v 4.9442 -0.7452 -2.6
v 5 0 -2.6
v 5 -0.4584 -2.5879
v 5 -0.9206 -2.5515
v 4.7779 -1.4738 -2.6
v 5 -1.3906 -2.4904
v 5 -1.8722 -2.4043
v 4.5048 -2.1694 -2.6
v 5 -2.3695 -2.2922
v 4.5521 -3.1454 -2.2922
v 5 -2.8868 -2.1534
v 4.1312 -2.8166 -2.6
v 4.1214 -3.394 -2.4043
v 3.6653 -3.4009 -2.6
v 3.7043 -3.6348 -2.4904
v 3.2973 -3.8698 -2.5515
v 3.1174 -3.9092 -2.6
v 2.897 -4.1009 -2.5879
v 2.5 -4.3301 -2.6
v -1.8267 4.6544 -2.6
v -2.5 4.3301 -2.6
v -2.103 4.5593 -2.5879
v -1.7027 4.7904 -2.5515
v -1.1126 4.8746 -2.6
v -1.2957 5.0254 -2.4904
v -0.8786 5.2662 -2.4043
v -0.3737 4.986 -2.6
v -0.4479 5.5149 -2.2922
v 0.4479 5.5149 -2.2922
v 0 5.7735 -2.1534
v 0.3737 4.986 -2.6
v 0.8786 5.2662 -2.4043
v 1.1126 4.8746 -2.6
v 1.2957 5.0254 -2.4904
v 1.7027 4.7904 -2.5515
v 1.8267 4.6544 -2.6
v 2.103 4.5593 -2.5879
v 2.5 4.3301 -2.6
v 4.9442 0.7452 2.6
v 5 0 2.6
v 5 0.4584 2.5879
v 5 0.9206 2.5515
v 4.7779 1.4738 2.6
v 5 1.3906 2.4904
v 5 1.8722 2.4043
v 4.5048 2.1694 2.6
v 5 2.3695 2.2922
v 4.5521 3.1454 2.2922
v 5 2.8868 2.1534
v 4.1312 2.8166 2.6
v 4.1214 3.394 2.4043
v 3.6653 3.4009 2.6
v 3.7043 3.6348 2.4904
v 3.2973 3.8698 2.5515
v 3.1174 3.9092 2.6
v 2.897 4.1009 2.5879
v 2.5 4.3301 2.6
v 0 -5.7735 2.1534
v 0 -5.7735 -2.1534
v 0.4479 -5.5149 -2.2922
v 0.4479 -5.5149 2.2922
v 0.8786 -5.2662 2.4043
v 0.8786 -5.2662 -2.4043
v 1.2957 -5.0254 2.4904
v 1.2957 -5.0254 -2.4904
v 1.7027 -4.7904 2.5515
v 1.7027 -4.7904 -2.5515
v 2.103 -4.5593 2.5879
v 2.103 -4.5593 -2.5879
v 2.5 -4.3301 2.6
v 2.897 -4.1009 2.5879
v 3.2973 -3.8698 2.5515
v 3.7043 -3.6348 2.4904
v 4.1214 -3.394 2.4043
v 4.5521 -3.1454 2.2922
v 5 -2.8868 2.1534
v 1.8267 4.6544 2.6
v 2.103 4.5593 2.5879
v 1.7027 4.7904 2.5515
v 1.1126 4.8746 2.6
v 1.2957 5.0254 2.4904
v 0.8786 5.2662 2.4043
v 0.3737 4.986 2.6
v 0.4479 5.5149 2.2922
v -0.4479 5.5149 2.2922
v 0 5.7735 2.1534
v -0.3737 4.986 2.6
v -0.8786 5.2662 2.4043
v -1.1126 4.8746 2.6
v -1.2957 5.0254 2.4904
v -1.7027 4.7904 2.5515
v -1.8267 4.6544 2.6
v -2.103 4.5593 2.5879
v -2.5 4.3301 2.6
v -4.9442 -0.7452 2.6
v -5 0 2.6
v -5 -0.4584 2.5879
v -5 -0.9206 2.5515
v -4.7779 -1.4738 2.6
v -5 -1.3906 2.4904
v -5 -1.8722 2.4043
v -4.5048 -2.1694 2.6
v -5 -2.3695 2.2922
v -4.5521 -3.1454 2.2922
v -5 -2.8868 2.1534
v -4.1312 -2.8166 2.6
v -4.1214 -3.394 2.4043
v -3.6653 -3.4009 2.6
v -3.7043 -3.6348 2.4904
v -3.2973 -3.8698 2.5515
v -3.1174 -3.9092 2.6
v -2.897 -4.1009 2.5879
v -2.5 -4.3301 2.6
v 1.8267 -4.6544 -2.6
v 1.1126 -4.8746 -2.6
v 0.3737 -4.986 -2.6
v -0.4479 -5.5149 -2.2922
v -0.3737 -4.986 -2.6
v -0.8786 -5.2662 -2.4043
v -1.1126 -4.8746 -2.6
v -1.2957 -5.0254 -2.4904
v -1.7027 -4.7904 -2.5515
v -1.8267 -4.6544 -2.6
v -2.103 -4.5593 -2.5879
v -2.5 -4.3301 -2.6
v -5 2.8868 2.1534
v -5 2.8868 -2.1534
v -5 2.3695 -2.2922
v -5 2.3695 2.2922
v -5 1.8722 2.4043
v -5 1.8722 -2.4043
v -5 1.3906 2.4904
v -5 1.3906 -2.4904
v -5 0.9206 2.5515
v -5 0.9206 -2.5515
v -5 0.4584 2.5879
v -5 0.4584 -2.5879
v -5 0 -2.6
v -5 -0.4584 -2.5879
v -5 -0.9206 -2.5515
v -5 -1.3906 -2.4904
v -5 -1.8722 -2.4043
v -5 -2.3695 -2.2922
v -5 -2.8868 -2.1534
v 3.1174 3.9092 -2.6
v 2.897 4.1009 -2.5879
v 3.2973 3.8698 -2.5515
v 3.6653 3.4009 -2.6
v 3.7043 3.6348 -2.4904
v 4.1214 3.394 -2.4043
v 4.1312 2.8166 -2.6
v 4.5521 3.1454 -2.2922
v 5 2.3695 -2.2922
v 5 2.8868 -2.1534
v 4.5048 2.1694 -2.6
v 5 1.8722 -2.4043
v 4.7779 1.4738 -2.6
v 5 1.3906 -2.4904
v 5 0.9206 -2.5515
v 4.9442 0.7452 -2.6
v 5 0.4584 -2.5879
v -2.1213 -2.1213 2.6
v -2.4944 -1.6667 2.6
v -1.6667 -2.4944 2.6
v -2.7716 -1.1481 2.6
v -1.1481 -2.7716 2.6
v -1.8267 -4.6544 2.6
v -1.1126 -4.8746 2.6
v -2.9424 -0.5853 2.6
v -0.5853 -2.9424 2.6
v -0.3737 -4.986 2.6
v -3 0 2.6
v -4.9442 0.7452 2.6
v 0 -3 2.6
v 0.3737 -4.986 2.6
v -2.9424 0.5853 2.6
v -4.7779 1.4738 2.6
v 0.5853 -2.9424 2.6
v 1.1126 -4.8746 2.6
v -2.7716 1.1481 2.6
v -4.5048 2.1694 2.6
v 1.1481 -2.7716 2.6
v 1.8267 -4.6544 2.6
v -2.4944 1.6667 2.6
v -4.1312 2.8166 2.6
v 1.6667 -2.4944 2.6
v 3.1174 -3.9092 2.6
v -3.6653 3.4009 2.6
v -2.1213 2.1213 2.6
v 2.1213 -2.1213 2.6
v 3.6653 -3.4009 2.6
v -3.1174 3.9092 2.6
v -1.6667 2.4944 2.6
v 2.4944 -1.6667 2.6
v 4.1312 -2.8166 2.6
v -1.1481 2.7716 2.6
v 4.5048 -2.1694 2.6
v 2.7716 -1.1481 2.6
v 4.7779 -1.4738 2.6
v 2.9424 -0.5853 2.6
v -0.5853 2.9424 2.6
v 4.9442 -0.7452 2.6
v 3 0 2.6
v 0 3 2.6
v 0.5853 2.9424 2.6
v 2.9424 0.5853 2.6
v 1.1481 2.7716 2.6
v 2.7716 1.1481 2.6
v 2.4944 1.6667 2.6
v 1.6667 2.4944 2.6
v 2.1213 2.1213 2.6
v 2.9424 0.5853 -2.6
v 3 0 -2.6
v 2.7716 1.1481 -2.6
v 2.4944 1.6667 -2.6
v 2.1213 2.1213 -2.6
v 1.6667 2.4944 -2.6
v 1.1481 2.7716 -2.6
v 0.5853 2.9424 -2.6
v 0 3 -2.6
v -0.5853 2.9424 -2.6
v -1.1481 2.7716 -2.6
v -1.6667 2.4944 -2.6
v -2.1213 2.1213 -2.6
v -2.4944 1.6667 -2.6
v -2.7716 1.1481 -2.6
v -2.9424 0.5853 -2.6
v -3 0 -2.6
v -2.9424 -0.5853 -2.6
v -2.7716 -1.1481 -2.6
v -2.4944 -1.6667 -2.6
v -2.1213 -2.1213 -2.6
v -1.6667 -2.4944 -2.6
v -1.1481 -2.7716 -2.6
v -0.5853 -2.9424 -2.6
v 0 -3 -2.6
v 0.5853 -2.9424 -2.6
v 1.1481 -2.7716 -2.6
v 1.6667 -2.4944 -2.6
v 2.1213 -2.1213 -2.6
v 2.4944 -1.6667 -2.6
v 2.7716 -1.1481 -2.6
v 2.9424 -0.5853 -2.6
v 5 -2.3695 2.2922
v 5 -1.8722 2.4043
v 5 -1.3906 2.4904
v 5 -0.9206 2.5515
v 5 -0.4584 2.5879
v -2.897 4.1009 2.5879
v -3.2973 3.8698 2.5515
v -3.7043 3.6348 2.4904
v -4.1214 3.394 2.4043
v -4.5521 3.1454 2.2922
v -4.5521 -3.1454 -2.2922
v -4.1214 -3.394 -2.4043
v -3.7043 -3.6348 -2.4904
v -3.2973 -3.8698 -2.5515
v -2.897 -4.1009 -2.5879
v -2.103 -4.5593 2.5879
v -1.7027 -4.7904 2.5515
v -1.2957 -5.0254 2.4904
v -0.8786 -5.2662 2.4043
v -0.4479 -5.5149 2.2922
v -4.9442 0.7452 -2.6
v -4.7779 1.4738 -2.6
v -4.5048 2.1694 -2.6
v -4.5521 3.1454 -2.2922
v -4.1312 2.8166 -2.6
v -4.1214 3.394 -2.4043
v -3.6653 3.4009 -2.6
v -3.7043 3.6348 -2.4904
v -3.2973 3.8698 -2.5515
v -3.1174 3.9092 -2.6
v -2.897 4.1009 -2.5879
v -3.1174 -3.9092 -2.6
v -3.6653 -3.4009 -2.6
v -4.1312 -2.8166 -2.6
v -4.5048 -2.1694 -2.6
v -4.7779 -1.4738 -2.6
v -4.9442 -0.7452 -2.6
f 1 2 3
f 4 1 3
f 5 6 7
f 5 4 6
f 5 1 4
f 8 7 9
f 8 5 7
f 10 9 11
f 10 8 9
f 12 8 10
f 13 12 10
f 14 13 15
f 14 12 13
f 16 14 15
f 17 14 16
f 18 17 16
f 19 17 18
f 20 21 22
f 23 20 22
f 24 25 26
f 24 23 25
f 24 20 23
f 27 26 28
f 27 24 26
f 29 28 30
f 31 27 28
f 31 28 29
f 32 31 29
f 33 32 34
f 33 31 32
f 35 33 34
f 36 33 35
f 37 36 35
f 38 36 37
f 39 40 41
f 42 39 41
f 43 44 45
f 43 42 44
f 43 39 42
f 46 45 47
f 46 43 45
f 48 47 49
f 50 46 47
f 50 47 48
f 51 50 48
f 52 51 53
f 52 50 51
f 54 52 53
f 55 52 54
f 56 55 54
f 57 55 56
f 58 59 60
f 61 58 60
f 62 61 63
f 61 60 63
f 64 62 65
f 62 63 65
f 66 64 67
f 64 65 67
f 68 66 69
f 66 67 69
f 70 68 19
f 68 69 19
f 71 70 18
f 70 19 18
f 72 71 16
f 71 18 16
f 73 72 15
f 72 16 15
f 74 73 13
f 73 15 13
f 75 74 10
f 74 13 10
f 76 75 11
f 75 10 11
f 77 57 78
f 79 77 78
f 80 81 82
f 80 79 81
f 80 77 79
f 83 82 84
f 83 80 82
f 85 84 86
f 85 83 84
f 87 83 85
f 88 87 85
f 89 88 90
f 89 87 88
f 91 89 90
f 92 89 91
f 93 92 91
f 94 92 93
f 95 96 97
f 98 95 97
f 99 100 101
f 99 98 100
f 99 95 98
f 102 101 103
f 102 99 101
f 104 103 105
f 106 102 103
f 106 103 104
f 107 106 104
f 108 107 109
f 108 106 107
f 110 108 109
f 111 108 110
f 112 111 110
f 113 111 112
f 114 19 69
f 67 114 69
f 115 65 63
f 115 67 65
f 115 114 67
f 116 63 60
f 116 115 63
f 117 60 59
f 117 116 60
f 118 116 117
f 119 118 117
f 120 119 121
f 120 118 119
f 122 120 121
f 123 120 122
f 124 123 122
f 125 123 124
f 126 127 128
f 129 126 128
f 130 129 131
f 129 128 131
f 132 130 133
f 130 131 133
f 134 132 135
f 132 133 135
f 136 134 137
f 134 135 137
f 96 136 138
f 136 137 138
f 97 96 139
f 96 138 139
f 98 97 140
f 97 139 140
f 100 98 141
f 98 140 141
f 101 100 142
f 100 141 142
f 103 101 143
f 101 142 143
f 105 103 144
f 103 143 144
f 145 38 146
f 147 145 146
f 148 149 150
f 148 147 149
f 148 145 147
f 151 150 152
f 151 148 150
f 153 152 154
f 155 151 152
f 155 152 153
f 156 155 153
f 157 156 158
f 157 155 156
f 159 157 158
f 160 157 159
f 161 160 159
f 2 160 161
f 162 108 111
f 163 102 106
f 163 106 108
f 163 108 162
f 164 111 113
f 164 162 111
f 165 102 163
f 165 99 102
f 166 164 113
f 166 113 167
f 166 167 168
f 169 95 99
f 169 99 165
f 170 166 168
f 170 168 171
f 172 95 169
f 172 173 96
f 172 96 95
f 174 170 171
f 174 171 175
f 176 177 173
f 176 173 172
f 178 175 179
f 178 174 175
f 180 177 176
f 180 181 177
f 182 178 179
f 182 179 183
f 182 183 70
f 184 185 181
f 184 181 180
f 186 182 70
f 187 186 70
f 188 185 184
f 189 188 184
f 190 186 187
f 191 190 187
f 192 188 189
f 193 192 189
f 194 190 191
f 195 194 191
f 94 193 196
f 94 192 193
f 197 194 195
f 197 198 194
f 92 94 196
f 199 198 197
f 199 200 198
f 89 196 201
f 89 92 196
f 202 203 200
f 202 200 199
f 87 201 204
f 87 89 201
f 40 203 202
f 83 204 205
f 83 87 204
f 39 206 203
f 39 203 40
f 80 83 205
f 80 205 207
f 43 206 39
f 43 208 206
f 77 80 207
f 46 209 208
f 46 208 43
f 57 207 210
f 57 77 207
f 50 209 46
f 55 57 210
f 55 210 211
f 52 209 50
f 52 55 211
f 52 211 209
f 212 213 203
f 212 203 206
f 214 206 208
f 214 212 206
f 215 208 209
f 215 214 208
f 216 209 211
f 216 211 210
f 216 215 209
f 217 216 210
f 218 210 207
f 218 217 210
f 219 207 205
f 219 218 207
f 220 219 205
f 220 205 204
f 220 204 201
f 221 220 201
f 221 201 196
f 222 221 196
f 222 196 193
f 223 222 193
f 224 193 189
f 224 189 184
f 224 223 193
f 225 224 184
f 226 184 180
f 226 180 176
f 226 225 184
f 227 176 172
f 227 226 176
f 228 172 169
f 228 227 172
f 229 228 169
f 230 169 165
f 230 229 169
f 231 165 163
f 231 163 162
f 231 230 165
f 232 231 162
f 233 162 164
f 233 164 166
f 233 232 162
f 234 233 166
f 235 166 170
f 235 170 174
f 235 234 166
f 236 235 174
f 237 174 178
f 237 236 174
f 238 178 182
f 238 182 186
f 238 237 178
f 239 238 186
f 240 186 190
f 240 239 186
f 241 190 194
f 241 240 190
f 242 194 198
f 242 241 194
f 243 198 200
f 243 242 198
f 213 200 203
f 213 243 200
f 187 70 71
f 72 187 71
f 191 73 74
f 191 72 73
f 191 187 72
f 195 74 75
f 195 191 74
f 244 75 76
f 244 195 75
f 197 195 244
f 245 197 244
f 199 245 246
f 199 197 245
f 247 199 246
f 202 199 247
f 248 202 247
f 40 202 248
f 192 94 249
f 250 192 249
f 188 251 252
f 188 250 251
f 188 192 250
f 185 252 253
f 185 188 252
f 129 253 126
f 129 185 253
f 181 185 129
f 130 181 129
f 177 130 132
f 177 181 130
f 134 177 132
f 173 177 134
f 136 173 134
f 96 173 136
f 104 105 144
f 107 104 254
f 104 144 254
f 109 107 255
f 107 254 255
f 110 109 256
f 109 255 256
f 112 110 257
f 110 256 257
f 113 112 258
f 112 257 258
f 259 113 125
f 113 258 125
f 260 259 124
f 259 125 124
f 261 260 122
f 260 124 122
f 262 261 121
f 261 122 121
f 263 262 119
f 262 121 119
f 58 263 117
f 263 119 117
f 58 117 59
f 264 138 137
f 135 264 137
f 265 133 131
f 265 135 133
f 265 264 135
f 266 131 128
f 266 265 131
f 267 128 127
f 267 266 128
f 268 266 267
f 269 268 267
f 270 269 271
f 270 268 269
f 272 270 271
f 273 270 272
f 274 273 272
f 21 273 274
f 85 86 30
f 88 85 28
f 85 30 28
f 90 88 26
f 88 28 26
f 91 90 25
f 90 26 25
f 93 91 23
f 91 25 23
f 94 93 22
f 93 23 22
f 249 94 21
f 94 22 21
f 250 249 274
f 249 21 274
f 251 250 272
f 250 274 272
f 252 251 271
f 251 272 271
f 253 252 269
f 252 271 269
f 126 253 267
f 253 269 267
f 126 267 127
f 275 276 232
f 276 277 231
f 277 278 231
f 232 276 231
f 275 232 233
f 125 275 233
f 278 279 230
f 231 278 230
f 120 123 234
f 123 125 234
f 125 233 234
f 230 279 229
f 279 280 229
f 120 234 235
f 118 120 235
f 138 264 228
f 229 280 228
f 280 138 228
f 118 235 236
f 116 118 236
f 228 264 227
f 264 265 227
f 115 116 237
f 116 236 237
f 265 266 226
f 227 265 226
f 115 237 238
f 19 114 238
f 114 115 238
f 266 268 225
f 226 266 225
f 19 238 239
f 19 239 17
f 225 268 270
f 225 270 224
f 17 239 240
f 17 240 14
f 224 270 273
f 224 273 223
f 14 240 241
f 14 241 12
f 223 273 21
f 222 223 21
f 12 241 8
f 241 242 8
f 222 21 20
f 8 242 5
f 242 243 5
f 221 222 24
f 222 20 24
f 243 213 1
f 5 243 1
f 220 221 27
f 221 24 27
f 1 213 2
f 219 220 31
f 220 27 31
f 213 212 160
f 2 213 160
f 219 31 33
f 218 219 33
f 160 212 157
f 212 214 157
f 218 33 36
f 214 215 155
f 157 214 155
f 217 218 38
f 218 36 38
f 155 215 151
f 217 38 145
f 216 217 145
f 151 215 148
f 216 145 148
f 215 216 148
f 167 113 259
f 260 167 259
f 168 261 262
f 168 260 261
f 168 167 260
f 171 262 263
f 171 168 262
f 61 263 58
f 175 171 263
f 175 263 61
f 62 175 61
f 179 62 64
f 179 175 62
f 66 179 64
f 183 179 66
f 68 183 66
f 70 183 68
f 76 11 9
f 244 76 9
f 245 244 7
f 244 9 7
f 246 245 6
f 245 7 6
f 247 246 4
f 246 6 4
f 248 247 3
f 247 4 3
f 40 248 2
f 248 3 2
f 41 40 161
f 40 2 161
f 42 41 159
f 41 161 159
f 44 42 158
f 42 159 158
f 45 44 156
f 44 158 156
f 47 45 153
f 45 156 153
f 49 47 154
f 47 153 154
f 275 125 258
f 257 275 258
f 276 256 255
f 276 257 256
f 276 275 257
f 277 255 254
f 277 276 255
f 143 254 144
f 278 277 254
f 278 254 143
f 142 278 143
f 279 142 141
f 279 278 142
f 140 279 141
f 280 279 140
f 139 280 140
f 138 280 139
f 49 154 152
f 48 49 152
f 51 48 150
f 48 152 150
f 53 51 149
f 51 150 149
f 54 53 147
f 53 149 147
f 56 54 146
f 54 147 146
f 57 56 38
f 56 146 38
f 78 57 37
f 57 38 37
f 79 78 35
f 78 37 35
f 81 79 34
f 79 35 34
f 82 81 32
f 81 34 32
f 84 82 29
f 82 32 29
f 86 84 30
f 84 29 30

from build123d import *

# Parameters (mm, degrees)
BOSS_EXTRUDE1_DEPTH      = 2.6
BOSS_EXTRUDE1_DEPTH_BACK = 2.6
SKETCH2_R                = 3
SKETCH3_OUTSIDE_W        = 50.698
SKETCH3_OUTSIDE_H        = 52.246
SKETCH3_OUTSIDE_R        = 5
CUT_EXTRUDE1_DEPTH       = 10.239769117
CUT_EXTRUDE1_DRAFT       = -60
MIRROR1_COPY_1_SKETCH_W  = 50.698
MIRROR1_COPY_1_SKETCH_H  = 52.246
MIRROR1_COPY_1_SKETCH_R  = 5
MIRROR1_COPY_1_DEPTH     = 10.239769117
MIRROR1_COPY_1_DRAFT     = -60


with BuildPart() as part:
    # Sketch2 → Boss-Extrude1 (new, two sides: drawn at the far end of the back side and taken through both)
    with BuildSketch(Plane.XY.offset(-BOSS_EXTRUDE1_DEPTH_BACK)):
        Polygon((0, 5.773502692), (-5, 2.886751346), (-5, -2.886751346), (0, -5.773502692), (5, -2.886751346), (5, 2.886751346), align=None)
        Circle(SKETCH2_R, mode=Mode.SUBTRACT)
    extrude(amount=BOSS_EXTRUDE1_DEPTH + BOSS_EXTRUDE1_DEPTH_BACK)


with BuildPart() as cut_extrude1_tool:
    # Sketch3 outside → Cut-Extrude1 (with draft: the straight prism first)
    with BuildSketch(Plane.XY.offset(2.6)):
        Rectangle(SKETCH3_OUTSIDE_W, SKETCH3_OUTSIDE_H)
        Circle(SKETCH3_OUTSIDE_R, mode=Mode.SUBTRACT)
    extrude(amount=-CUT_EXTRUDE1_DEPTH)
    # Cut-Extrude1: the draft: its side faces are tilted about the plane it starts from
    cut_extrude1_sides = [cut_extrude1_tool.faces().sort_by_distance(p)[0] for p in [
        (0, -26.123, -2.519884558),
        (25.349, 0, -2.519884558),
        (0, 26.123, -2.519884558),
        (-25.349, 0, -2.519884558),
        (-5, 0, -2.519884558),
    ]]
    draft(cut_extrude1_sides, Plane.XY.offset(2.6), CUT_EXTRUDE1_DRAFT)


with BuildPart() as part_1:
    add(part.part)

    # Cut-Extrude1: cut by cut_extrude1_tool
    add(cut_extrude1_tool.part, mode=Mode.SUBTRACT)


with BuildPart() as mirror1_copy_1_tool:
    # Mirror1 copy 1 sketch → Mirror1 copy 1 (with draft: the straight prism first)
    with BuildSketch(Plane(origin=(0, 0, -2.6), x_dir=(1, 0, 0), z_dir=(0, 0, -1))):
        Rectangle(MIRROR1_COPY_1_SKETCH_W, MIRROR1_COPY_1_SKETCH_H)
        Circle(MIRROR1_COPY_1_SKETCH_R, mode=Mode.SUBTRACT)
    extrude(amount=-MIRROR1_COPY_1_DEPTH)
    # Mirror1 copy 1: the draft: its side faces are tilted about the plane it starts from
    mirror1_copy_1_sides = [mirror1_copy_1_tool.faces().sort_by_distance(p)[0] for p in [
        (0, -26.123, 2.519884558),
        (25.349, 0, 2.519884558),
        (0, 26.123, 2.519884558),
        (-25.349, 0, 2.519884558),
        (-5, 0, 2.519884558),
    ]]
    draft(mirror1_copy_1_sides, Plane(origin=(0, 0, -2.6), x_dir=(1, 0, 0), z_dir=(0, 0, -1)), MIRROR1_COPY_1_DRAFT)


with BuildPart() as part_2:
    add(part_1.part)

    # Mirror1 copy 1: cut by mirror1_copy_1_tool
    add(mirror1_copy_1_tool.part, mode=Mode.SUBTRACT)


solid = part_2.part
